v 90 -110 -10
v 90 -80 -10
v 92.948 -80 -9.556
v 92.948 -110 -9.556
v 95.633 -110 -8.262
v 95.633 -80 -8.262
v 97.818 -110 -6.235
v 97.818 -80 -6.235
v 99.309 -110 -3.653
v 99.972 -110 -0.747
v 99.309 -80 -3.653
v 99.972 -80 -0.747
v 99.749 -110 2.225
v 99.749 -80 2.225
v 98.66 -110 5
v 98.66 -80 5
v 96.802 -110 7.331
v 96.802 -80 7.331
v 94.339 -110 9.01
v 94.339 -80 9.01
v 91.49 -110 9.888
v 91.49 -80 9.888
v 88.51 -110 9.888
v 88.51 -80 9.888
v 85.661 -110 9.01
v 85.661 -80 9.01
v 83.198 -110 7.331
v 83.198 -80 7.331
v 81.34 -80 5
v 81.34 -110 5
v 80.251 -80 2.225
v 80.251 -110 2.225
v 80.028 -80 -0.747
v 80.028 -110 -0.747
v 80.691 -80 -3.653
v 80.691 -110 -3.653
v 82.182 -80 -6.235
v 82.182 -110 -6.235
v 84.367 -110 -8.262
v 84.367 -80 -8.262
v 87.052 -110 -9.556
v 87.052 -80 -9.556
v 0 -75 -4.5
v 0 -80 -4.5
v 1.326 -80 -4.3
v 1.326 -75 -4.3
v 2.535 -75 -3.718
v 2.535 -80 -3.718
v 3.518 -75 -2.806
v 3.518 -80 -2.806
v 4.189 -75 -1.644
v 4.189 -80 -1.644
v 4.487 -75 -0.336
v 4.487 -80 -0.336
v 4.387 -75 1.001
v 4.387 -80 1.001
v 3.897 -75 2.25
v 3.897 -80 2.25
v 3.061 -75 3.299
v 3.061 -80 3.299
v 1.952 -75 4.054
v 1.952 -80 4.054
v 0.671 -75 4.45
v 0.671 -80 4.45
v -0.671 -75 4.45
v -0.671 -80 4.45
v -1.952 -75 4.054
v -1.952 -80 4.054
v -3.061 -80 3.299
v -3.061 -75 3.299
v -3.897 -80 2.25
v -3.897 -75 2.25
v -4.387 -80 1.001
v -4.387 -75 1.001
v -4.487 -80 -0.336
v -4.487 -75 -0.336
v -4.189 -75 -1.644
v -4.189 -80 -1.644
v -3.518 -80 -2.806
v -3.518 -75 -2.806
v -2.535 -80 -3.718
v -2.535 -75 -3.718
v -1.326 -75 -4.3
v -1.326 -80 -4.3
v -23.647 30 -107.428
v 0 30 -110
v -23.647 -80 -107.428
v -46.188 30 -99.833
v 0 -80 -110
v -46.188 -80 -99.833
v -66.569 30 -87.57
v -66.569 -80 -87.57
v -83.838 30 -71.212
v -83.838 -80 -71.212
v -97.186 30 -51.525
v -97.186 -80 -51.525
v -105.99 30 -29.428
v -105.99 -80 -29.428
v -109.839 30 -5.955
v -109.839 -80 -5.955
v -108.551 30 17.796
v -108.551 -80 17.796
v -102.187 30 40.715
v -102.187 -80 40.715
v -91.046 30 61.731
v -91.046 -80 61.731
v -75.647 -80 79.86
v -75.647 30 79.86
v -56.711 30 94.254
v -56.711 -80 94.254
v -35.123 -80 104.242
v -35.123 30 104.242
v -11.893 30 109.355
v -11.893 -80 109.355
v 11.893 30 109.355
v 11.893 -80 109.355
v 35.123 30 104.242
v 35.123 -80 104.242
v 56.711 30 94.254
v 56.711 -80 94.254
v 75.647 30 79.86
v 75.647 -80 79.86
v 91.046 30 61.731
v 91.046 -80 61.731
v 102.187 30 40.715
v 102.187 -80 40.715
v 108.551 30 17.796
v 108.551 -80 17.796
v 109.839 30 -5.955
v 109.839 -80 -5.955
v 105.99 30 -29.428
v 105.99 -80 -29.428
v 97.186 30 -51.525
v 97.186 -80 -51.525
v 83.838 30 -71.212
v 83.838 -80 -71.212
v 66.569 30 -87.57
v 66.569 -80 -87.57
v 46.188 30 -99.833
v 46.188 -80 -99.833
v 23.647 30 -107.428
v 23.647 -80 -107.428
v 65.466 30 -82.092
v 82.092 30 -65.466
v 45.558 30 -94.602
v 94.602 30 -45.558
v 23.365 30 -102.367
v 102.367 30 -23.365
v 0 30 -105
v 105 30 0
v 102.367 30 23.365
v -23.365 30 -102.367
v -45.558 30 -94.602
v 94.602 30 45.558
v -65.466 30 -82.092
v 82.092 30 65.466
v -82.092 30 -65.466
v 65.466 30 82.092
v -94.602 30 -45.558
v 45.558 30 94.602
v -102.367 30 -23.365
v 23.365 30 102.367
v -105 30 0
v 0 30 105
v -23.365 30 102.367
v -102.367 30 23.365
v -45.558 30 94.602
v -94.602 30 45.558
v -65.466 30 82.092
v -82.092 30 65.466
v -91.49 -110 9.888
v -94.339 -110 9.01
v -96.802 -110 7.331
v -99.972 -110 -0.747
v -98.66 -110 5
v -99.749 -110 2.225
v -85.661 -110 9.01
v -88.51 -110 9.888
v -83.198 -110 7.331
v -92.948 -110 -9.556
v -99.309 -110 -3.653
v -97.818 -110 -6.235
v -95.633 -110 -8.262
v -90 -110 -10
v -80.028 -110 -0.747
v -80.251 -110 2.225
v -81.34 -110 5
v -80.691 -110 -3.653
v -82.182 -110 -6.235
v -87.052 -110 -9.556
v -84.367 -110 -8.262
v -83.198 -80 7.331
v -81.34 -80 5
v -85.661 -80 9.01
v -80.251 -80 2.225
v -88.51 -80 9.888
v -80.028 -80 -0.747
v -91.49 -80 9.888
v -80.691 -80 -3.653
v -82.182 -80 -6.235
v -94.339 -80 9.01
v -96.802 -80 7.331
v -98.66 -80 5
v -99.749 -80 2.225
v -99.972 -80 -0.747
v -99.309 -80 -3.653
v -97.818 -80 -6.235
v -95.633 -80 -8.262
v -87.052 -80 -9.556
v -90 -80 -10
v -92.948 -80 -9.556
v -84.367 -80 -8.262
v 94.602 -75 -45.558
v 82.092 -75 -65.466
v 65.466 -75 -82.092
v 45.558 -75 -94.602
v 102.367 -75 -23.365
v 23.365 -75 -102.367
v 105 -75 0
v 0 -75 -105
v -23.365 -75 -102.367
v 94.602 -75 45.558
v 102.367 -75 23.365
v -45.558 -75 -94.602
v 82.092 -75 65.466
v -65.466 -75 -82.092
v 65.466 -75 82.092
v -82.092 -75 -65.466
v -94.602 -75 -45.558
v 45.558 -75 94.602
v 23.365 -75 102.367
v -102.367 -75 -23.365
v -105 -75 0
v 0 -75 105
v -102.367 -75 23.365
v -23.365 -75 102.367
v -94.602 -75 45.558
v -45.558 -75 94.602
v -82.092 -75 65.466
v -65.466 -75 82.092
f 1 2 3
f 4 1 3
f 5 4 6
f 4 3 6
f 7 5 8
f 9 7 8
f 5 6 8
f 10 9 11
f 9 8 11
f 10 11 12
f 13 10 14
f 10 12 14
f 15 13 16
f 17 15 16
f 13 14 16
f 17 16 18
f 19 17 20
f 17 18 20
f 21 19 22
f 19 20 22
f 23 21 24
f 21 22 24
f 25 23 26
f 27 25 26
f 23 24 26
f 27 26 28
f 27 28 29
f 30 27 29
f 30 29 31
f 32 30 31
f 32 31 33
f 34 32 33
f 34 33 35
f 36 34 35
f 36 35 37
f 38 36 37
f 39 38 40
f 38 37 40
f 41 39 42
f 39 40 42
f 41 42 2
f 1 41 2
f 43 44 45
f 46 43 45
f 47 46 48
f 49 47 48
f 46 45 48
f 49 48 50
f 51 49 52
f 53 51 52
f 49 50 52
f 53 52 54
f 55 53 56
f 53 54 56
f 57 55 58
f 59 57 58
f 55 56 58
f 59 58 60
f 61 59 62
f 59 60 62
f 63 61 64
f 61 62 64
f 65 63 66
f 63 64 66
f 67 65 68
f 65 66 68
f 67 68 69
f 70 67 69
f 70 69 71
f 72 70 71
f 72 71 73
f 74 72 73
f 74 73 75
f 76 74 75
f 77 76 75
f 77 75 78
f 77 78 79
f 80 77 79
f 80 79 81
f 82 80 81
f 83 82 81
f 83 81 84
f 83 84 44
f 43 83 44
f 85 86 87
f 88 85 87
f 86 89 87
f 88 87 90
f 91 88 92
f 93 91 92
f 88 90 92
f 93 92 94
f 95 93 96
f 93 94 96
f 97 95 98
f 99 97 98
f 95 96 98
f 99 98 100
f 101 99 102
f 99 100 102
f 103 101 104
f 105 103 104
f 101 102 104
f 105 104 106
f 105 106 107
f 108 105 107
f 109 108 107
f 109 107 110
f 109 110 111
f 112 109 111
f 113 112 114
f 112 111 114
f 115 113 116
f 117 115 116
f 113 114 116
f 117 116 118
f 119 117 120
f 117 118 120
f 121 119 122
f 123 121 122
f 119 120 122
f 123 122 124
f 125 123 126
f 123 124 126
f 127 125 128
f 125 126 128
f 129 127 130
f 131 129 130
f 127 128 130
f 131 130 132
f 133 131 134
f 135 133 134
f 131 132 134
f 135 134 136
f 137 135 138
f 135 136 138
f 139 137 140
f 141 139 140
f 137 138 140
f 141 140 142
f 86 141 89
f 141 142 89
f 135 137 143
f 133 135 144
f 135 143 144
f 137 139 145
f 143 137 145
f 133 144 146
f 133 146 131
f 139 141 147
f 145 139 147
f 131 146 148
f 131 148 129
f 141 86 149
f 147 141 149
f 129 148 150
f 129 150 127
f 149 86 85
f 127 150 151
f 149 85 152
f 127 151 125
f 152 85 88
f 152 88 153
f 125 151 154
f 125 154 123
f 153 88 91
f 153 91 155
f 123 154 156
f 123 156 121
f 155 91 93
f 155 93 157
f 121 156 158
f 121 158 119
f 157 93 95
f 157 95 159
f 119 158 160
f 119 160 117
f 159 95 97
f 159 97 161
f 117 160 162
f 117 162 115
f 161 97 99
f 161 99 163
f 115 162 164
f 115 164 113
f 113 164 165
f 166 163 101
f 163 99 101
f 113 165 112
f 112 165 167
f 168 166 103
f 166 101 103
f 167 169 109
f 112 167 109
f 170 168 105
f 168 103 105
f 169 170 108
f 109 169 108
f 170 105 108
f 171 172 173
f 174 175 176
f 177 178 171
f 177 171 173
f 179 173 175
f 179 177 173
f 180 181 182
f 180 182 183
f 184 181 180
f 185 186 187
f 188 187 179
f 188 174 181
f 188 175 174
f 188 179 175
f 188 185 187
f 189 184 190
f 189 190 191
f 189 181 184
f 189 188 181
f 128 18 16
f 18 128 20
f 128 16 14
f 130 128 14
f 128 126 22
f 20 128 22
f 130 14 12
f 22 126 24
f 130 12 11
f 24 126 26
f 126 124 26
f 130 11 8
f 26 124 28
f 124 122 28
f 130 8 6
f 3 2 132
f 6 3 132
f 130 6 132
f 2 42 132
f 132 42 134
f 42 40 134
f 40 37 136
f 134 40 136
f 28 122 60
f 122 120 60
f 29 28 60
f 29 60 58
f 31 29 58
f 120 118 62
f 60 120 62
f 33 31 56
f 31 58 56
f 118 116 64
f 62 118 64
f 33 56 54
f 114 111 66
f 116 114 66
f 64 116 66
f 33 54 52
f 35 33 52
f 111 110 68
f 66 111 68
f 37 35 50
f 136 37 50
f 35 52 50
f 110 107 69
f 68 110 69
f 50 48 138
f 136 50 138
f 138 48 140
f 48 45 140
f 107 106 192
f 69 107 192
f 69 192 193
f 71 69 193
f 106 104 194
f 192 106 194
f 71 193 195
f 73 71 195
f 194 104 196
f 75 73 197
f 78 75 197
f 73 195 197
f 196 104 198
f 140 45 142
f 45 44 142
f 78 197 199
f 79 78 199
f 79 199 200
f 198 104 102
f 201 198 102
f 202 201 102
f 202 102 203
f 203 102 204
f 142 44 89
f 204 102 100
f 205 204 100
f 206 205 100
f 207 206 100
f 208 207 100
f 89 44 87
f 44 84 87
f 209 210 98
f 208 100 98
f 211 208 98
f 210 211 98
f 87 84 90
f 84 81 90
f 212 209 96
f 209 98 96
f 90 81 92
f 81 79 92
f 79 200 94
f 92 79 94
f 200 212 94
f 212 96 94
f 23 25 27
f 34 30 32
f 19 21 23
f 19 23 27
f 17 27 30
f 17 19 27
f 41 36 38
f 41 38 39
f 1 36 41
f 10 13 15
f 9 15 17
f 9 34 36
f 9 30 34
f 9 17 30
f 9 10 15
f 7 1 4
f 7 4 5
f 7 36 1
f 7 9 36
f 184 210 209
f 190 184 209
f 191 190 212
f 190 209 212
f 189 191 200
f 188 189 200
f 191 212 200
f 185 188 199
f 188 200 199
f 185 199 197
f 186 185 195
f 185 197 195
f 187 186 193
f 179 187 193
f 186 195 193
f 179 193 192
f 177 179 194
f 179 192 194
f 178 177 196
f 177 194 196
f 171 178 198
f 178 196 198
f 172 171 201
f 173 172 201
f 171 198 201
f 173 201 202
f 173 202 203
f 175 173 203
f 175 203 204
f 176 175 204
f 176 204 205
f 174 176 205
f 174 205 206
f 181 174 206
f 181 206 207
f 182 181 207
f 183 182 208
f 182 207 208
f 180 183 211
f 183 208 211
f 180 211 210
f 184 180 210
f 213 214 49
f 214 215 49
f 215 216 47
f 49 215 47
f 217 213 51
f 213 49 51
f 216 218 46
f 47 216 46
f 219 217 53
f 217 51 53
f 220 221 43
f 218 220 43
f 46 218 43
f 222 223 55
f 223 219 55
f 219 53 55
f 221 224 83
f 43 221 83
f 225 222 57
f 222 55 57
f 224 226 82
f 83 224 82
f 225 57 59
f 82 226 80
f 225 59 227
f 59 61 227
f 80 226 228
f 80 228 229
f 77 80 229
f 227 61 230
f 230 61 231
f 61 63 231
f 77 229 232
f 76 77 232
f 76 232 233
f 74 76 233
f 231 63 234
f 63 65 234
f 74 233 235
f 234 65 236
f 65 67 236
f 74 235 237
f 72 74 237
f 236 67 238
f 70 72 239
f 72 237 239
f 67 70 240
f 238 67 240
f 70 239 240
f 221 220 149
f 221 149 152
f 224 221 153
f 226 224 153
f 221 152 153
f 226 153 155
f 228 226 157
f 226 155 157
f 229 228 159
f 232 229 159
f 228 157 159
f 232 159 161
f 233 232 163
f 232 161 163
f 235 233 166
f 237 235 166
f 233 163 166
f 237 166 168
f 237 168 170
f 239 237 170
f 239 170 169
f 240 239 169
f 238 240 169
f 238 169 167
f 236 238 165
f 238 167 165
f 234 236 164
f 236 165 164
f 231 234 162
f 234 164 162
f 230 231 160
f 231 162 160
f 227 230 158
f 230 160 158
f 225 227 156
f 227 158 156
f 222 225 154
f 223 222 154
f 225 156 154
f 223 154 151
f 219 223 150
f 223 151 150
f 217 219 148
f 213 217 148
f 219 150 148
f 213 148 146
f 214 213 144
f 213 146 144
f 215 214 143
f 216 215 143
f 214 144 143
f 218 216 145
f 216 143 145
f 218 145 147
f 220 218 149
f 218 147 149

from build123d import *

# Parameters (mm, degrees)
CUT_EXTRUDE2_REACH  = 192.526
MOTOR_HOLE_R        = 4.5
STABLIZING_POLES_R  = 10
BOSS_EXTRUDE1_DEPTH = 30


with BuildPart() as part:
    # Compartment → Revolve1 (revolve)
    with BuildSketch(Plane.XY, mode=Mode.PRIVATE) as revolve1_sk:
        Polygon((110, -80), (0, -80), (0, -75), (105, -75), (105, 30), (110, 30), align=None)
    revolve(revolve1_sk.sketch.rotate(Axis((0, 0, 0), (0, 1, 0)), 90), axis=Axis((0, 0, 0), (0, 1, 0)))

    # Motor Hole → Cut-Extrude2 (cut, up to next)
    with BuildSketch(Plane.XZ.offset(80), mode=Mode.PRIVATE) as cut_extrude2_sk1:
        with Locations(Location((0, 0, 0), (0, 0, 270))):
            Circle(MOTOR_HOLE_R)
    cut_extrude2_tool1 = extrude(cut_extrude2_sk1.sketch, amount=-CUT_EXTRUDE2_REACH, mode=Mode.PRIVATE) & part.part
    add(cut_extrude2_tool1.solids().sort_by_distance((0, -80, 0))[0], mode=Mode.SUBTRACT)

    # Stablizing poles → Boss-Extrude1 (add)
    with BuildSketch(Plane.XZ.offset(80)):
        with Locations(Location((-90, 0, 0), (0, 0, 270))):
            Circle(STABLIZING_POLES_R)
        with Locations(Location((90, 0, 0), (0, 0, 270))):
            Circle(STABLIZING_POLES_R)
    extrude(amount=BOSS_EXTRUDE1_DEPTH)


solid = part.part
